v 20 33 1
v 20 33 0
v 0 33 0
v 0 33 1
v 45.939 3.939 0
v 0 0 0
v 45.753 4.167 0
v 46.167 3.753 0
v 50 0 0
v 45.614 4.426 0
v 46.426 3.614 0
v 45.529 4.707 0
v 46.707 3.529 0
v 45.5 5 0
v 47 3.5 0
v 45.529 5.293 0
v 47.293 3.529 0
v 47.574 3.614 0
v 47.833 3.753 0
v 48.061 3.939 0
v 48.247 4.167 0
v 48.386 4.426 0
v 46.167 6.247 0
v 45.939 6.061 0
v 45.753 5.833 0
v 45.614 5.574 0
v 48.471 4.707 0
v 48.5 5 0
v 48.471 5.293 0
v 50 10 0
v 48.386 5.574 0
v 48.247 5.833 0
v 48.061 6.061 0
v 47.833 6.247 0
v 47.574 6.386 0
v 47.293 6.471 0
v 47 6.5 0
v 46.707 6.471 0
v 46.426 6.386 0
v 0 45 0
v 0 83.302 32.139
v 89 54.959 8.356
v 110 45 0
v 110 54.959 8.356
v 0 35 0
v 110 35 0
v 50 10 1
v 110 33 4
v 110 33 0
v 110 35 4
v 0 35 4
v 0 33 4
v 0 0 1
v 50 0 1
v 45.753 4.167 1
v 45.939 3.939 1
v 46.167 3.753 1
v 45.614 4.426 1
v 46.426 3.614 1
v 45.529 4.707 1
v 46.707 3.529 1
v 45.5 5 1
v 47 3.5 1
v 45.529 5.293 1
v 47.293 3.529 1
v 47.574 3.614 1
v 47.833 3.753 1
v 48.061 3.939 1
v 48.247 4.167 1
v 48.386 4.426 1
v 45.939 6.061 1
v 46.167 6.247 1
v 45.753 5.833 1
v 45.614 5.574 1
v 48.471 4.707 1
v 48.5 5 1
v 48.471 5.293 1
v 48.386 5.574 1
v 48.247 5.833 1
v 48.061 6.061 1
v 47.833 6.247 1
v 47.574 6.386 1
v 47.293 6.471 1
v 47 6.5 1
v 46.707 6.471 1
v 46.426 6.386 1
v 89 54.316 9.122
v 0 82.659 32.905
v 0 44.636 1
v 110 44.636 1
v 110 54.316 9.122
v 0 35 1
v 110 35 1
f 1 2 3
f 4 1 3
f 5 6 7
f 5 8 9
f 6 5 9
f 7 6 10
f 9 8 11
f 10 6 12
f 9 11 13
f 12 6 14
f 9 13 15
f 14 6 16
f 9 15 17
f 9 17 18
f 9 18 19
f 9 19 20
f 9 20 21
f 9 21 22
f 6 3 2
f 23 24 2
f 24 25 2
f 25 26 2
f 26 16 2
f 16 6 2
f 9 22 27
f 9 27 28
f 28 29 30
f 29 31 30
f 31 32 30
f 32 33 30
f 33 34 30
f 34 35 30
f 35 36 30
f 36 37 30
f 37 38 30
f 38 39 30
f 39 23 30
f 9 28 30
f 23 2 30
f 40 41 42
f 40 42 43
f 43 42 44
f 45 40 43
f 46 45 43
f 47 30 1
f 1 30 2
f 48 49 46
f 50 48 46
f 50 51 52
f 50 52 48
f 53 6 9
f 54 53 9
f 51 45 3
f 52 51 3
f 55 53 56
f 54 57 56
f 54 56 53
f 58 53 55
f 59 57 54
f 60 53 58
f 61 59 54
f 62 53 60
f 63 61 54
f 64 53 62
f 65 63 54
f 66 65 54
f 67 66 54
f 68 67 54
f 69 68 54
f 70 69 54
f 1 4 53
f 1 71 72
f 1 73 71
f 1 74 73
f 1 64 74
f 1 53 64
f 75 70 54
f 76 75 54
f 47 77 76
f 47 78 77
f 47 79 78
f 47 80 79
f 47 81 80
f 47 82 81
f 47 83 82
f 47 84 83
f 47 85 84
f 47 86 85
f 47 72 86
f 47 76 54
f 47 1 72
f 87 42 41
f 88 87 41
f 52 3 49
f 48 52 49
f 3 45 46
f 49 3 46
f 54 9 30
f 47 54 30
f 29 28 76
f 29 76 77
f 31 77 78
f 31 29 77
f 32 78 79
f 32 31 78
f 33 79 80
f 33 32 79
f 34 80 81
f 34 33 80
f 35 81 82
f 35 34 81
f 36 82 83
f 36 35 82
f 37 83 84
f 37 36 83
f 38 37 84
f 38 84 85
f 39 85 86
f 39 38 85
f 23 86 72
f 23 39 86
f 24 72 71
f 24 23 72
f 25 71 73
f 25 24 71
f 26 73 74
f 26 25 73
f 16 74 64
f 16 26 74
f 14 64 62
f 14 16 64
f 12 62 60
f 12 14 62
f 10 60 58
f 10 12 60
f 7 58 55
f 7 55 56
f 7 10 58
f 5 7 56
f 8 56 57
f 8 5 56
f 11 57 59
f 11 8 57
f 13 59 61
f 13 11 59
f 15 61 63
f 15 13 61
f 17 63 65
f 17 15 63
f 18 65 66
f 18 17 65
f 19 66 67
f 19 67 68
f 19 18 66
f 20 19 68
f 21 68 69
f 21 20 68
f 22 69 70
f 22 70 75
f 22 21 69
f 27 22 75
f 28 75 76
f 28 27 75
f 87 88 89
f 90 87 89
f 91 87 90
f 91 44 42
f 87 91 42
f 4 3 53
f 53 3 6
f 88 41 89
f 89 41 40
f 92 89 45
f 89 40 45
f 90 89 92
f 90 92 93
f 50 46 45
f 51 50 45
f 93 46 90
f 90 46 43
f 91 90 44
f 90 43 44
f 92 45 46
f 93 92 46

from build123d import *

# Parameters (mm, degrees)
F0_W     = 110
F0_H     = 10
F0_R     = 3
F0_R_2   = 1.5
F1_DEPTH = 1
F2_DEPTH = 4
F5_DEPTH = 1


with BuildPart() as f1:
    # F0 (on Top) → F1 (new body)
    with BuildSketch(Plane.XY):
        with Locations((55, 40)):
            Rectangle(F0_W, F0_H)
        Polygon((0, 33), (0, 0), (50, 0), (50, 5), (50, 10), (20, 33), align=None)
        with Locations((47, 5)):
            Circle(F0_R, mode=Mode.SUBTRACT)
        with Locations((47, 5)):
            Circle(F0_R)
        with Locations((47, 5)):
            Circle(F0_R_2, mode=Mode.SUBTRACT)
    extrude(amount=F1_DEPTH)

    # F4 (on face) → F5 (join)
    with BuildSketch(Plane(origin=(0, 18.592916, -22.158174), x_dir=(1, 0, 0), z_dir=(0, -0.642788, 0.766044))):
        Polygon((0, 84.472), (0, 34.472), (110, 34.472), (110, 47.472), (89, 47.472), align=None)
    extrude(amount=F5_DEPTH)


with BuildPart() as f2:
    # F0 (on Top) → F2 (new body)
    with BuildSketch(Plane.XY):
        Polygon((0, 35), (0, 33), (20, 33), (110, 33), (110, 35), align=None)
    extrude(amount=F2_DEPTH)


solid = Compound([f1.part, f2.part])
